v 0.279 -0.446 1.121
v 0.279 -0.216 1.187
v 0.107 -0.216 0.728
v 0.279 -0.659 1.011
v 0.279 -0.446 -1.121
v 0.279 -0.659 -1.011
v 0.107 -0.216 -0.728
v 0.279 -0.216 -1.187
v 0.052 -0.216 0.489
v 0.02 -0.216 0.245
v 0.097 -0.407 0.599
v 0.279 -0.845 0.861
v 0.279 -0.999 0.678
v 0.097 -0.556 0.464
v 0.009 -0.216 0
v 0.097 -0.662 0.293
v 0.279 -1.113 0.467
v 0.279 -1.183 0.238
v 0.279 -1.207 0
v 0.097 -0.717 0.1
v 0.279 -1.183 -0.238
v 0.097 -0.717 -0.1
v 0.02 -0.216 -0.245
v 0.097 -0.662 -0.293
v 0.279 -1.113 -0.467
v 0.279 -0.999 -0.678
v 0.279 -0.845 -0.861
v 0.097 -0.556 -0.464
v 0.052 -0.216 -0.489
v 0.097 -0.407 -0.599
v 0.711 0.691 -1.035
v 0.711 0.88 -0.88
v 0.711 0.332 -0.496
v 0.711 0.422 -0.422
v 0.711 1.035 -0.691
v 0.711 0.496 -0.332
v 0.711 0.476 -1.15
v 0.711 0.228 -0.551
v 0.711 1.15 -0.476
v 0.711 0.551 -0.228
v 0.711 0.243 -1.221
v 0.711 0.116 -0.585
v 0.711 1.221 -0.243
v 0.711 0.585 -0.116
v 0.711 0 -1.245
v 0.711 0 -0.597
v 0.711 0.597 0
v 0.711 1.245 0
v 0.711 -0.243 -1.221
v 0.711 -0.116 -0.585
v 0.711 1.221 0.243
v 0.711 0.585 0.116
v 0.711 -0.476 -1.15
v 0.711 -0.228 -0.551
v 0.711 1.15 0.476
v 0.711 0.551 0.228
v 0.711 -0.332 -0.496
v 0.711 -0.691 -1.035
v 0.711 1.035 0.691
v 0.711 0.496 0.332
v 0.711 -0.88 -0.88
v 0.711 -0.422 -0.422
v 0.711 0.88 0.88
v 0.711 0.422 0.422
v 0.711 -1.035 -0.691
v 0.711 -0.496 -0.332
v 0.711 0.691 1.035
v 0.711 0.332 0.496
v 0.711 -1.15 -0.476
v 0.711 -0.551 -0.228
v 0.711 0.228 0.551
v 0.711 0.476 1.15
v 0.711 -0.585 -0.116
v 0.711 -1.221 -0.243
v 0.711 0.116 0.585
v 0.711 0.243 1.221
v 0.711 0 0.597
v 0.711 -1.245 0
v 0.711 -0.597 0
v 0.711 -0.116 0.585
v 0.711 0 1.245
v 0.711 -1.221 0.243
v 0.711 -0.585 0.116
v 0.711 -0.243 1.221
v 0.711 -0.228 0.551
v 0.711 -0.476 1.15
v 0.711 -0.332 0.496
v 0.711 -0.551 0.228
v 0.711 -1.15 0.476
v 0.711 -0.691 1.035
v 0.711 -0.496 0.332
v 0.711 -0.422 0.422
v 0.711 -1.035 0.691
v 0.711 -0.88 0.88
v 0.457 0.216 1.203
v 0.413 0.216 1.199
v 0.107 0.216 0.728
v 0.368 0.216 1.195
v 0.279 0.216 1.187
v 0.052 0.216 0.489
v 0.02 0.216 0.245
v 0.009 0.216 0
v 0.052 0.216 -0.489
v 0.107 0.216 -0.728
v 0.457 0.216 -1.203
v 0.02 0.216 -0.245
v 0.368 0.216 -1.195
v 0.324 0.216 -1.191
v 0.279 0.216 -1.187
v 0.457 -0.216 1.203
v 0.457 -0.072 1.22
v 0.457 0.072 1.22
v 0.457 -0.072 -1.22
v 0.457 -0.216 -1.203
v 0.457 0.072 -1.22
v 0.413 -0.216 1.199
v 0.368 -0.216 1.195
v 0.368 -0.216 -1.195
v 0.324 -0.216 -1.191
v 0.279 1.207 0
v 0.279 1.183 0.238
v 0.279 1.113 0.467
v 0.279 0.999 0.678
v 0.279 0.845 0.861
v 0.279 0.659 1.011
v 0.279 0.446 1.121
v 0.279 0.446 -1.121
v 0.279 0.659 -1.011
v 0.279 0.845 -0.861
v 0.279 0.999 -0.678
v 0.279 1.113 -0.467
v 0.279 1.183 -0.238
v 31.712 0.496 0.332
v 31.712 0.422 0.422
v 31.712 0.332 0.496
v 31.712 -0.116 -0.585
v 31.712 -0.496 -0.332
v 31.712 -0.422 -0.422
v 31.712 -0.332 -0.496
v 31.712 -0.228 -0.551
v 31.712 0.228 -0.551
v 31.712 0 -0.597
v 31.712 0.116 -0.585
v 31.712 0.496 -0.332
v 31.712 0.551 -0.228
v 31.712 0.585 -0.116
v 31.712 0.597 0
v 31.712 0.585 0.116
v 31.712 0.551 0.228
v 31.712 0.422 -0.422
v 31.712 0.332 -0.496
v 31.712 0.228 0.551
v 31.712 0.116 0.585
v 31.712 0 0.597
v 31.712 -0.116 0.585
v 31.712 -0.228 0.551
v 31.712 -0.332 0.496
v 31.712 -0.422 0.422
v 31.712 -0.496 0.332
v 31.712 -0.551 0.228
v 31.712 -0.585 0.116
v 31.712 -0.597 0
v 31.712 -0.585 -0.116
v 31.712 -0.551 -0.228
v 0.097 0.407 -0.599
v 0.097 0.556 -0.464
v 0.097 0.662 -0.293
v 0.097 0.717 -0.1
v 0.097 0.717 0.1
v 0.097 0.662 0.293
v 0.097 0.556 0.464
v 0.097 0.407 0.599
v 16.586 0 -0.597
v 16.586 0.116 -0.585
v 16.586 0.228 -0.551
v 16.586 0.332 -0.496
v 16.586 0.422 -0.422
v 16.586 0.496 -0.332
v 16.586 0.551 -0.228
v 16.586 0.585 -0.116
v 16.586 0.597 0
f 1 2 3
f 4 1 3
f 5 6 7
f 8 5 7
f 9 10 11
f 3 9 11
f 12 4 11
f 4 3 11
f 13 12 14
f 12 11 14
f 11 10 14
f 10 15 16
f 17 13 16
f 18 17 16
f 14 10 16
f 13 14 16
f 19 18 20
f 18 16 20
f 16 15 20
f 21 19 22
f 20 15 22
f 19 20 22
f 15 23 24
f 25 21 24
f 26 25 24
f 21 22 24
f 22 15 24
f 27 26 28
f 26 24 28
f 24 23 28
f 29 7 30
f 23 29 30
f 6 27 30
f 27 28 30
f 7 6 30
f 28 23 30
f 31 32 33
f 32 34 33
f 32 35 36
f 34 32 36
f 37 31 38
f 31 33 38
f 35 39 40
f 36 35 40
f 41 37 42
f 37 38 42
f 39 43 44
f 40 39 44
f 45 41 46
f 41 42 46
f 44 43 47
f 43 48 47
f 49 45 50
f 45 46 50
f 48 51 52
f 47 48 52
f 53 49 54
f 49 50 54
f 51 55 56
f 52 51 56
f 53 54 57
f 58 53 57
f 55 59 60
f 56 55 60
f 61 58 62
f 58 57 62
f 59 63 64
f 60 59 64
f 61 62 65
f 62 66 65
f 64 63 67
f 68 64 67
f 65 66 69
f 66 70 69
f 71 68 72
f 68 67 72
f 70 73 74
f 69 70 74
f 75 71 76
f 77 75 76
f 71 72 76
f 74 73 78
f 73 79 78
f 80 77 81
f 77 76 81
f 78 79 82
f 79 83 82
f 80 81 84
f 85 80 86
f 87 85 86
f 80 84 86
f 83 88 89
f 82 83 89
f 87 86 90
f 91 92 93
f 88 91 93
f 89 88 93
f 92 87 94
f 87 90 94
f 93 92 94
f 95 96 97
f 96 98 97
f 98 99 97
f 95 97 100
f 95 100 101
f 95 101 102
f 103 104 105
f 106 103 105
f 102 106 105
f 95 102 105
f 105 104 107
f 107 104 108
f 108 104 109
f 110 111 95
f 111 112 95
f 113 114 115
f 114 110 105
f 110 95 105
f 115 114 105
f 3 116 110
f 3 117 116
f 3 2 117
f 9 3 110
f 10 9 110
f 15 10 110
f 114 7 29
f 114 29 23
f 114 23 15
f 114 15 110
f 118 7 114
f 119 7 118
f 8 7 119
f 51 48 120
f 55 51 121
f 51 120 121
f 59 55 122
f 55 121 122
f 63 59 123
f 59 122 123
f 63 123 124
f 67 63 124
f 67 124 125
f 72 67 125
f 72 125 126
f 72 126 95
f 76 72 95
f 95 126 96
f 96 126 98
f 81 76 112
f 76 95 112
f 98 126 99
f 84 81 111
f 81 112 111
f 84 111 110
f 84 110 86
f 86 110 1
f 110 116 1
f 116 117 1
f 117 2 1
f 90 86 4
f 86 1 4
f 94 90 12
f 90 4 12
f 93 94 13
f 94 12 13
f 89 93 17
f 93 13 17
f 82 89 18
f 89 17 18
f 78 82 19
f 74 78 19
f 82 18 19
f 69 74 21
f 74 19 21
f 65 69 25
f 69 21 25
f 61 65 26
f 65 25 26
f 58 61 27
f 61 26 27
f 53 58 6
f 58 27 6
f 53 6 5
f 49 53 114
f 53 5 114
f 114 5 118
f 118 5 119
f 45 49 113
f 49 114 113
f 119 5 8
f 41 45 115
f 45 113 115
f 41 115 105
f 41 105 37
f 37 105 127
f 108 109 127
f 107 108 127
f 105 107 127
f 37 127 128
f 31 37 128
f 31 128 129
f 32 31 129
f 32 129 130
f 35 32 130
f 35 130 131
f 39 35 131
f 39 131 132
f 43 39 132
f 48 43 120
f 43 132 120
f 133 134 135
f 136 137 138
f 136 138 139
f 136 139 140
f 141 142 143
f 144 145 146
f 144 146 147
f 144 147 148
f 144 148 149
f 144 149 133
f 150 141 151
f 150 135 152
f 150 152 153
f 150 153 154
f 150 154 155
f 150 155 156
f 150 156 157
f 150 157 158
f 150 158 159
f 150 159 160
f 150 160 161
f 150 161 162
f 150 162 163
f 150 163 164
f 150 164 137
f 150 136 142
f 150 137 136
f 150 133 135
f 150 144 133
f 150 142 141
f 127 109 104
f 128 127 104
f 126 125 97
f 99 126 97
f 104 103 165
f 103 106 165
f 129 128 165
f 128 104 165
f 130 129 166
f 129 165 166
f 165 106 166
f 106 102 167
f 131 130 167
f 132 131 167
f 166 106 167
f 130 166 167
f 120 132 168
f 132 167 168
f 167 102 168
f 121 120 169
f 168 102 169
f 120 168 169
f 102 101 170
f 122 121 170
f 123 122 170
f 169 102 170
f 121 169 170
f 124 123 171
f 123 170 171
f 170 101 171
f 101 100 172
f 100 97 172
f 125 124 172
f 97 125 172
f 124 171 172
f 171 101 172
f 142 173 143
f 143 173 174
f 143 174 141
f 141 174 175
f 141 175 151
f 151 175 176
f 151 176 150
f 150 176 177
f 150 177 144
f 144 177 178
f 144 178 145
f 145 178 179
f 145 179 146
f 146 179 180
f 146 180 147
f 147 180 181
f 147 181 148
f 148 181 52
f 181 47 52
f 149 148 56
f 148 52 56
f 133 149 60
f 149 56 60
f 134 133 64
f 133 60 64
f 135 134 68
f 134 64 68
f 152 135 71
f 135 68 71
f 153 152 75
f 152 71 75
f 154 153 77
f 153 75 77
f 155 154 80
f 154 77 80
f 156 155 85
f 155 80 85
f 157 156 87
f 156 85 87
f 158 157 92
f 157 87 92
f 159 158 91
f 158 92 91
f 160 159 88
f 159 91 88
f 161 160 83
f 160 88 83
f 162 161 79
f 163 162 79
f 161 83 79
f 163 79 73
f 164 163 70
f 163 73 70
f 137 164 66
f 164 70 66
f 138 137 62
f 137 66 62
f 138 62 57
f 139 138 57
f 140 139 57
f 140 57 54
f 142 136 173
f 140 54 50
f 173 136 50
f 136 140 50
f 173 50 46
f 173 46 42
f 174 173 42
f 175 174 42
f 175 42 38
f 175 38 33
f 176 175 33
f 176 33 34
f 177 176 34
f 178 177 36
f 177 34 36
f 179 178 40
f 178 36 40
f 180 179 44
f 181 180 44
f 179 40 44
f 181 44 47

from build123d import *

# Parameters (mm, degrees)
SKETCH2_W                    = 2.4892
SKETCH2_H                    = 0.4318
SLOT_DEPTH                   = 0.4572
SCHIZZO2_R                   = 0.5969
ESTRUSIONE_ESTRUSIONE1_DEPTH = 15.1257


with BuildPart() as part:
    # BodySke → Base-Revolve (revolve)
    with BuildSketch(Plane.XY):
        with BuildLine():
            Line((0.7112, 0.5969), (0.7112, 1.2446))
            Line((0.7112, 1.2446), (0.2794, 1.206822395))
            ThreePointArc((0.2794, 1.206822395), (0.070761718, 0.619371587), (0, 0))
            Line((0, 0), (16.5862, 0))
            Line((16.5862, 0), (16.5862, 0.5969))
            Line((16.5862, 0.5969), (0.7112, 0.5969))
        make_face()
    revolve(axis=Axis((-25.4, 0, 0), (1, 0, 0)))

    # Sketch2 → Slot (cut)
    with BuildSketch(Plane(origin=(0, 0, 0), x_dir=(0, 0, -1), z_dir=(1, 0, 0))):
        Rectangle(SKETCH2_W, SKETCH2_H)
    extrude(amount=SLOT_DEPTH, mode=Mode.SUBTRACT)

    # Schizzo2 → Estrusione-Estrusione1 (add)
    with BuildSketch(Plane(origin=(16.5862, 0, 0), x_dir=(0, 0, -1), z_dir=(1, 0, 0))):
        Circle(SCHIZZO2_R)
    extrude(amount=ESTRUSIONE_ESTRUSIONE1_DEPTH)


solid = part.part
